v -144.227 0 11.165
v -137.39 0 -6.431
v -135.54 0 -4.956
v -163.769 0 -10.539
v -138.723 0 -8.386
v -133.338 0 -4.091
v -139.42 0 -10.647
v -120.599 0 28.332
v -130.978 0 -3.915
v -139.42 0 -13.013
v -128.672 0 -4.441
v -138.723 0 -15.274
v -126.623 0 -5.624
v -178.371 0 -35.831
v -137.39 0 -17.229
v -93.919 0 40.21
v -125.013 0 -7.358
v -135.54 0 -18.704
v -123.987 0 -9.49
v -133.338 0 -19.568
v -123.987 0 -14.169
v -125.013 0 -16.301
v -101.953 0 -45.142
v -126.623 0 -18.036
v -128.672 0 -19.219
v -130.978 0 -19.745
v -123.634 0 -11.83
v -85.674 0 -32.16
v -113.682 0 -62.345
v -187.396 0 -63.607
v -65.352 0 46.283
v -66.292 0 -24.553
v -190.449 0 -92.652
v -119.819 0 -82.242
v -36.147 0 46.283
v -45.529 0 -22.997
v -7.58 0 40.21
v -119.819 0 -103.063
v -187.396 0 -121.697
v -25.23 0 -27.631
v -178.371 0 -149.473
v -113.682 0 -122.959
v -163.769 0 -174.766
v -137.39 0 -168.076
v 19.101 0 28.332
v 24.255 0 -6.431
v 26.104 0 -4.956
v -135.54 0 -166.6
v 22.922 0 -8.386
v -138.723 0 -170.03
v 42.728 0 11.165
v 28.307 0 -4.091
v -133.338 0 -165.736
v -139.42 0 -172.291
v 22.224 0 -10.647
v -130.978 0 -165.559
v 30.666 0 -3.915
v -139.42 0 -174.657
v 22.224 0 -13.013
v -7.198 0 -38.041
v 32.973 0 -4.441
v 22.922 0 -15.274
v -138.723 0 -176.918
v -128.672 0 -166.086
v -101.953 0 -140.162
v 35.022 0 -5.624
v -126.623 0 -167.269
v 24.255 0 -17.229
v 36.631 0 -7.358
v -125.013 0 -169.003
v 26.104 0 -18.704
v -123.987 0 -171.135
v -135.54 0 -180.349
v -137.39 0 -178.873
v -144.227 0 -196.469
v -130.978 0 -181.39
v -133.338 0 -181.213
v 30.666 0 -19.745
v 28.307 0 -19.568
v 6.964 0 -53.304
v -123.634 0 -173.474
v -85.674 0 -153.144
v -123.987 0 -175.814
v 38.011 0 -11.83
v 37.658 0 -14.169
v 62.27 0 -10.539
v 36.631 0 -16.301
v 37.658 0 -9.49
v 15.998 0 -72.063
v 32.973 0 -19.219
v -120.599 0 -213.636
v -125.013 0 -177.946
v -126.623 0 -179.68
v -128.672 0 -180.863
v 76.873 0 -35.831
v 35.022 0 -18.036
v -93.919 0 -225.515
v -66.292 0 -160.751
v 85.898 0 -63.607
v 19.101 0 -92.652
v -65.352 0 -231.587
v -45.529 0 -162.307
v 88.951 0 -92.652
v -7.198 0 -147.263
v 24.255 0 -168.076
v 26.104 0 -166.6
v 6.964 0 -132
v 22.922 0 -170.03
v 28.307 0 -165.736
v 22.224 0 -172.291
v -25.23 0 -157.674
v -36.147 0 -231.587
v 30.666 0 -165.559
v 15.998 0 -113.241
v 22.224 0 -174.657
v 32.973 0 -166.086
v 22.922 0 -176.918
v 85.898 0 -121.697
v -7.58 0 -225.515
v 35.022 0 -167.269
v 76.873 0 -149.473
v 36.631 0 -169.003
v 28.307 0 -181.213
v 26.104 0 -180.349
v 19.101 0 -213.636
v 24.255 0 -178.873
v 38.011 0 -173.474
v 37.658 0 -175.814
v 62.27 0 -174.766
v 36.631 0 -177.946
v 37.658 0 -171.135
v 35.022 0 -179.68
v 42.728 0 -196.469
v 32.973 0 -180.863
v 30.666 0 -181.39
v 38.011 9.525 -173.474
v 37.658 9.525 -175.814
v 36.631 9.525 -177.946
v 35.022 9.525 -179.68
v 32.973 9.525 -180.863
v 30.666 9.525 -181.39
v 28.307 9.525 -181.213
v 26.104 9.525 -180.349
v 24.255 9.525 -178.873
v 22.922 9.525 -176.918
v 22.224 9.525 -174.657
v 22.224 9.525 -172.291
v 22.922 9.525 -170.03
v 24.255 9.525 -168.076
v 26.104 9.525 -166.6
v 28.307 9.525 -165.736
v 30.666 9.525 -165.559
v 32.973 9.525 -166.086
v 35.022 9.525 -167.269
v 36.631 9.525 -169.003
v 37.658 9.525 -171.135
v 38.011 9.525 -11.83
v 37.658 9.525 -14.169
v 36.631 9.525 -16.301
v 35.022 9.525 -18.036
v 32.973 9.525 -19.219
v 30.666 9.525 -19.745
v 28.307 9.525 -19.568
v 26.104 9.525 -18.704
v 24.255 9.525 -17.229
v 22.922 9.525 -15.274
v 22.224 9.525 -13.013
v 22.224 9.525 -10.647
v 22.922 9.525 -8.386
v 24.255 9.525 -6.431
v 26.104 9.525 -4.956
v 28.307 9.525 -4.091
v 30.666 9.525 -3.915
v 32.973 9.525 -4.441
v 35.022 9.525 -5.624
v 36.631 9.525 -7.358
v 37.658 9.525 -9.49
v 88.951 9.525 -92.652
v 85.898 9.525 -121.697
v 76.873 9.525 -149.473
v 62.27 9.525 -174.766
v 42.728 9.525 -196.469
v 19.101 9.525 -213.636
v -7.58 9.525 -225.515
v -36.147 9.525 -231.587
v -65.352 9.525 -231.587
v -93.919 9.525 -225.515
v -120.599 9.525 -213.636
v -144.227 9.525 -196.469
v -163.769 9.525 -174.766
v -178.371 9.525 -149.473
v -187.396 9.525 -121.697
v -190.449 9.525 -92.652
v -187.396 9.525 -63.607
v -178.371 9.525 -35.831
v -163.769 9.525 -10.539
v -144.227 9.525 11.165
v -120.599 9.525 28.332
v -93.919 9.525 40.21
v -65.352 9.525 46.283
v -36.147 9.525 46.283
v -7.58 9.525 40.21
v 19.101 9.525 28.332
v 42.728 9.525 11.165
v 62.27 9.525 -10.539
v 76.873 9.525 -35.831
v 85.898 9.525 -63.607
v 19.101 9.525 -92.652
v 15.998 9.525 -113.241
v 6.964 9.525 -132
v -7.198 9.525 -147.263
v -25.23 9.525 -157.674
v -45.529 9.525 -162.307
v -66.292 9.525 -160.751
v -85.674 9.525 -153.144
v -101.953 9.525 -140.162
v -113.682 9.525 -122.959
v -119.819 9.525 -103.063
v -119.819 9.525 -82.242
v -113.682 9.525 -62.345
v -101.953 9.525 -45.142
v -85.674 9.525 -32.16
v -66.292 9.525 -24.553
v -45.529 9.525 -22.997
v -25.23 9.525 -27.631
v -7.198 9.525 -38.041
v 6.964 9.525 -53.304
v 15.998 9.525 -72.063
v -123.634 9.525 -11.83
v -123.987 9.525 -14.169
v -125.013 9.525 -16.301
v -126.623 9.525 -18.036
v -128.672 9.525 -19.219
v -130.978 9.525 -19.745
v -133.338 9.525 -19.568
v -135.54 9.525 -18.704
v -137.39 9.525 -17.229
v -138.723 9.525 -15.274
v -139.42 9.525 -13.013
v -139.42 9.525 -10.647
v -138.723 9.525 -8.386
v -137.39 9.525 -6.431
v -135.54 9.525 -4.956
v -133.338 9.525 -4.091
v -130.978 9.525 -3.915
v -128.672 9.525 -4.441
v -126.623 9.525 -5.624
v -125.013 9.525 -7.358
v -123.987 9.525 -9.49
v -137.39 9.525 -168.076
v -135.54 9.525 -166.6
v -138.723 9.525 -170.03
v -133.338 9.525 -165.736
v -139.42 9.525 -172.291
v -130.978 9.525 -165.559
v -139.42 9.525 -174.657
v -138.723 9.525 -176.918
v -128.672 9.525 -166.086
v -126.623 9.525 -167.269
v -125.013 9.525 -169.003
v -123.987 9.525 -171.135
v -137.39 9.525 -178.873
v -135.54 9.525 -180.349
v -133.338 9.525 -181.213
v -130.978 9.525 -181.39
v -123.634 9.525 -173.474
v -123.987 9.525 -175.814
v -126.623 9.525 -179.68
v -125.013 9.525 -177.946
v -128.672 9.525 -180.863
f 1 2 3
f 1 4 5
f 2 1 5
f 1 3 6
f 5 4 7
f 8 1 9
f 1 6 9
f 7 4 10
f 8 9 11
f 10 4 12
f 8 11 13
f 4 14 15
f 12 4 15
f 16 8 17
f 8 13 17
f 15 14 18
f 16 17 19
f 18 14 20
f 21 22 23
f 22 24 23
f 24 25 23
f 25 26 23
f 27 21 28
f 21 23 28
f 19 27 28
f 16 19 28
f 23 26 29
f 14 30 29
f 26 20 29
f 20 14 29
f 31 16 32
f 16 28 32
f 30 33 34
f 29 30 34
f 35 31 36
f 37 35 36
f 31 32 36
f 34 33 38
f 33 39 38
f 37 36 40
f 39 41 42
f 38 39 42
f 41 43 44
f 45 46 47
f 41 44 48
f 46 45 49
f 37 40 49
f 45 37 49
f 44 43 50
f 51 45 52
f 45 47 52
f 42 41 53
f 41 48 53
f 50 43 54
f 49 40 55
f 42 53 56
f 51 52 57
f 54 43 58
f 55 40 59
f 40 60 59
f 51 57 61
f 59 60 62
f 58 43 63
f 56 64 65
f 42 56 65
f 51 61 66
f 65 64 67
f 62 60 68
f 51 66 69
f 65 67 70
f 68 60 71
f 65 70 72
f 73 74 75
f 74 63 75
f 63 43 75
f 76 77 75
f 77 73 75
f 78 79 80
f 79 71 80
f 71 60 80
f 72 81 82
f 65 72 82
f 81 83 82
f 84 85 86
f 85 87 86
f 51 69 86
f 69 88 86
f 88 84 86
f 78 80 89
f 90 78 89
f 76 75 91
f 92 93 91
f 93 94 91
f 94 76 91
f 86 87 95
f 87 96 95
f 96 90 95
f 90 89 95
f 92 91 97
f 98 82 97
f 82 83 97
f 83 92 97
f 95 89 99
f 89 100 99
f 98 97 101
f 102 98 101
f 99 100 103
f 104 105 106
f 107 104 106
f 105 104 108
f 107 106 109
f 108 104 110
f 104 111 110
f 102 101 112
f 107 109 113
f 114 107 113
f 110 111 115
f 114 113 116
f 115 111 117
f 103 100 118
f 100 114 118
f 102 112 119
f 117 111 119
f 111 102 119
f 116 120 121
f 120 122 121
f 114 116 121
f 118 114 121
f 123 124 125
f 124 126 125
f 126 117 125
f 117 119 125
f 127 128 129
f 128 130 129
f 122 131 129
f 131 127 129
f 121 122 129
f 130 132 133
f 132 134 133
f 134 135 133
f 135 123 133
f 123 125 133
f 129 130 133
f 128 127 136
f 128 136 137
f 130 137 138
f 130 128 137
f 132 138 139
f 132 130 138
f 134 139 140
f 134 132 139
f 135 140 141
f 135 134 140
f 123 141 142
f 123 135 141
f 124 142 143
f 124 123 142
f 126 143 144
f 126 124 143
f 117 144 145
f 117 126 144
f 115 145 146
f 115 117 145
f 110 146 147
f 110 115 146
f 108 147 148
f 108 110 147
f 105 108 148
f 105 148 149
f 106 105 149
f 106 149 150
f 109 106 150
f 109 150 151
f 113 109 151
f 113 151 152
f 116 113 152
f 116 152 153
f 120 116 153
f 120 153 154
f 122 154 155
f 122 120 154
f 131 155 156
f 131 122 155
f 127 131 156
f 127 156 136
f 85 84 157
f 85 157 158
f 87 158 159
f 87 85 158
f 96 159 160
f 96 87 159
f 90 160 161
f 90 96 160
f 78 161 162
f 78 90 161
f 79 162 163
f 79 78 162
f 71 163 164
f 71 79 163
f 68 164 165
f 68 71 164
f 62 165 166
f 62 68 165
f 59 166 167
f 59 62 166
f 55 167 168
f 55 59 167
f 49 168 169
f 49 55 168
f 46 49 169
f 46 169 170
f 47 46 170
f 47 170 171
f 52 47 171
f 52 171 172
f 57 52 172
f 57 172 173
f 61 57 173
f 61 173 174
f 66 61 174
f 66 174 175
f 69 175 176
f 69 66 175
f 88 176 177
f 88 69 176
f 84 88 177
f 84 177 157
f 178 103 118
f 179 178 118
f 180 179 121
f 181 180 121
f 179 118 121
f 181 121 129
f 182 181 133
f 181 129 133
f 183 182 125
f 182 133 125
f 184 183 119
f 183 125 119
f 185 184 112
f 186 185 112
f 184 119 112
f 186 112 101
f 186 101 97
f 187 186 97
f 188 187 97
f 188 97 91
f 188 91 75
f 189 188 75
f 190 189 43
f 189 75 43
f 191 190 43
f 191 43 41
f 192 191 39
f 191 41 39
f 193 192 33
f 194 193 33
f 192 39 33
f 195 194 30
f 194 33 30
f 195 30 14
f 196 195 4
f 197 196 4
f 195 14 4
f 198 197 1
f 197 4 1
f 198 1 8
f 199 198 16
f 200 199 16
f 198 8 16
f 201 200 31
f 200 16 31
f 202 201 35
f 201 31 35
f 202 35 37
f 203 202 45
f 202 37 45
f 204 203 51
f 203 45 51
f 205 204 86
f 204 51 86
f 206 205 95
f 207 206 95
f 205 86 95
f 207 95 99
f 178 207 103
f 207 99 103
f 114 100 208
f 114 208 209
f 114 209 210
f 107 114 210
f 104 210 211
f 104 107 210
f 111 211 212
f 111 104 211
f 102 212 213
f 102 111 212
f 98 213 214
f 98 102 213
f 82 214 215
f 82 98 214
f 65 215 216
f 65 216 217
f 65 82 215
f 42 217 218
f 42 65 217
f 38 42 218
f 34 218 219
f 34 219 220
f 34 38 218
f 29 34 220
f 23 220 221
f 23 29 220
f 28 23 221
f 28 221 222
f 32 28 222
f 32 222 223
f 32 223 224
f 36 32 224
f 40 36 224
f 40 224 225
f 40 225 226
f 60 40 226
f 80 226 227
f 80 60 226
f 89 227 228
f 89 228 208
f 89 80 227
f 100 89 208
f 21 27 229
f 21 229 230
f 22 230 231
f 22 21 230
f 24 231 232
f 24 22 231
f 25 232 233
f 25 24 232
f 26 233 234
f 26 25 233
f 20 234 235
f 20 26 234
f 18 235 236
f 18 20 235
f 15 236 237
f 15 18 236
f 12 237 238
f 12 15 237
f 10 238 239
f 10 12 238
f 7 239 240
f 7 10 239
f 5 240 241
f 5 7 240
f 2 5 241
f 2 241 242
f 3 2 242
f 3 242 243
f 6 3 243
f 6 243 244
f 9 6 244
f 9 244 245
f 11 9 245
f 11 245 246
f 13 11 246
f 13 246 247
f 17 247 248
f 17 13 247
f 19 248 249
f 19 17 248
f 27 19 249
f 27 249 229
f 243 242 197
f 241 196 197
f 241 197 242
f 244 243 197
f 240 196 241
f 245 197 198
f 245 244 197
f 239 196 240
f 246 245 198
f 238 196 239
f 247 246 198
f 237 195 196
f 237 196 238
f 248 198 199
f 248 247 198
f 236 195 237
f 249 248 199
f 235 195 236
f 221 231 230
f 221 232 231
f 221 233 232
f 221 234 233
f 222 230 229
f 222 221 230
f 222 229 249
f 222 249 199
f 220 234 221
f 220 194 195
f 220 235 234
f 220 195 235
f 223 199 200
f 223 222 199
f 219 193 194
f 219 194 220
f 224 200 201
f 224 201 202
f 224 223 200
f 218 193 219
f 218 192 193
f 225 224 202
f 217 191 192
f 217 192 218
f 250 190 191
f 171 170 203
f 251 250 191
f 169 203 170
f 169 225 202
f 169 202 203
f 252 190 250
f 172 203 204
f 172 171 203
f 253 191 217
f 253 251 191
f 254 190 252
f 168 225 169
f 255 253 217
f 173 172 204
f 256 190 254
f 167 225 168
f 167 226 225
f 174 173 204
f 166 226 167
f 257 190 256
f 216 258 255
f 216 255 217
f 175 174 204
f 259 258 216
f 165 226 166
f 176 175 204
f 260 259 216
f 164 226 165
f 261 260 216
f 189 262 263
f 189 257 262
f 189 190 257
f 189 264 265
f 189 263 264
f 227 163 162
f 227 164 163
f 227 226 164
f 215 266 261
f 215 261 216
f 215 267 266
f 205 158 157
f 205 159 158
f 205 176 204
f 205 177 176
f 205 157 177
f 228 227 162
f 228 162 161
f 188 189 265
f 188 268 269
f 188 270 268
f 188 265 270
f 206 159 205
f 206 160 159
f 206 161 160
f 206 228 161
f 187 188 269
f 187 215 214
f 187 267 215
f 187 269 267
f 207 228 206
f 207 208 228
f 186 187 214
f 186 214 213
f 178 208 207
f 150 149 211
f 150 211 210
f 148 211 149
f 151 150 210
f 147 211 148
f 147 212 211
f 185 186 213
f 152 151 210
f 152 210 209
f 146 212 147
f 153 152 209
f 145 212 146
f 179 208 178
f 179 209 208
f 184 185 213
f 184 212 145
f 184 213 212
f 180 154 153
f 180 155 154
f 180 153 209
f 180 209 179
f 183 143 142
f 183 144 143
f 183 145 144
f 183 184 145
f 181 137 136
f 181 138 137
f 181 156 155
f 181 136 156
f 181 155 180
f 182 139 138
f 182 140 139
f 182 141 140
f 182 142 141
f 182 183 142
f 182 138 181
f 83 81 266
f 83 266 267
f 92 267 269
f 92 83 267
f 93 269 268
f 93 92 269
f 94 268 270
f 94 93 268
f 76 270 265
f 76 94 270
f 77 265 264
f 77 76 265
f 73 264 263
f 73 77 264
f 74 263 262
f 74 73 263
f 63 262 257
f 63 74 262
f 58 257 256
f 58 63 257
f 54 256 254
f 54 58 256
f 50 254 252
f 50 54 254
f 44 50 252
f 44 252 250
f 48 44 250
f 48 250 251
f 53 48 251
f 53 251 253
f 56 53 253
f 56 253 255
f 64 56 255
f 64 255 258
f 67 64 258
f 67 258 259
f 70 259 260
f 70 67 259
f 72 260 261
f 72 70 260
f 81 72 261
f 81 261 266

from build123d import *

# Parameters (mm, degrees)
SKETCH1_R           = 139.7
SKETCH1_R_2         = 69.85
SKETCH1_R_3         = 7.9375
BOSS_EXTRUDE1_DEPTH = 9.525


with BuildPart() as part:
    # Sketch1 → Boss-Extrude1 (new body)
    with BuildSketch(Plane(origin=(0, 0, 0), x_dir=(1, 0, 0), z_dir=(0, 1, 0))):
        with Locations((-50.749179719, 92.652131738)):
            Circle(SKETCH1_R)
        with Locations((-50.749179719, 92.652131738)):
            Circle(SKETCH1_R_2, mode=Mode.SUBTRACT)
        with Locations((-131.571484808, 173.474436827)):
            Circle(SKETCH1_R_3, mode=Mode.SUBTRACT)
        with Locations((-131.571484808, 11.829826648)):
            Circle(SKETCH1_R_3, mode=Mode.SUBTRACT)
        with Locations((30.073125371, 11.829826648)):
            Circle(SKETCH1_R_3, mode=Mode.SUBTRACT)
        with Locations((30.073125371, 173.474436827)):
            Circle(SKETCH1_R_3, mode=Mode.SUBTRACT)
    extrude(amount=BOSS_EXTRUDE1_DEPTH)


solid = part.part
